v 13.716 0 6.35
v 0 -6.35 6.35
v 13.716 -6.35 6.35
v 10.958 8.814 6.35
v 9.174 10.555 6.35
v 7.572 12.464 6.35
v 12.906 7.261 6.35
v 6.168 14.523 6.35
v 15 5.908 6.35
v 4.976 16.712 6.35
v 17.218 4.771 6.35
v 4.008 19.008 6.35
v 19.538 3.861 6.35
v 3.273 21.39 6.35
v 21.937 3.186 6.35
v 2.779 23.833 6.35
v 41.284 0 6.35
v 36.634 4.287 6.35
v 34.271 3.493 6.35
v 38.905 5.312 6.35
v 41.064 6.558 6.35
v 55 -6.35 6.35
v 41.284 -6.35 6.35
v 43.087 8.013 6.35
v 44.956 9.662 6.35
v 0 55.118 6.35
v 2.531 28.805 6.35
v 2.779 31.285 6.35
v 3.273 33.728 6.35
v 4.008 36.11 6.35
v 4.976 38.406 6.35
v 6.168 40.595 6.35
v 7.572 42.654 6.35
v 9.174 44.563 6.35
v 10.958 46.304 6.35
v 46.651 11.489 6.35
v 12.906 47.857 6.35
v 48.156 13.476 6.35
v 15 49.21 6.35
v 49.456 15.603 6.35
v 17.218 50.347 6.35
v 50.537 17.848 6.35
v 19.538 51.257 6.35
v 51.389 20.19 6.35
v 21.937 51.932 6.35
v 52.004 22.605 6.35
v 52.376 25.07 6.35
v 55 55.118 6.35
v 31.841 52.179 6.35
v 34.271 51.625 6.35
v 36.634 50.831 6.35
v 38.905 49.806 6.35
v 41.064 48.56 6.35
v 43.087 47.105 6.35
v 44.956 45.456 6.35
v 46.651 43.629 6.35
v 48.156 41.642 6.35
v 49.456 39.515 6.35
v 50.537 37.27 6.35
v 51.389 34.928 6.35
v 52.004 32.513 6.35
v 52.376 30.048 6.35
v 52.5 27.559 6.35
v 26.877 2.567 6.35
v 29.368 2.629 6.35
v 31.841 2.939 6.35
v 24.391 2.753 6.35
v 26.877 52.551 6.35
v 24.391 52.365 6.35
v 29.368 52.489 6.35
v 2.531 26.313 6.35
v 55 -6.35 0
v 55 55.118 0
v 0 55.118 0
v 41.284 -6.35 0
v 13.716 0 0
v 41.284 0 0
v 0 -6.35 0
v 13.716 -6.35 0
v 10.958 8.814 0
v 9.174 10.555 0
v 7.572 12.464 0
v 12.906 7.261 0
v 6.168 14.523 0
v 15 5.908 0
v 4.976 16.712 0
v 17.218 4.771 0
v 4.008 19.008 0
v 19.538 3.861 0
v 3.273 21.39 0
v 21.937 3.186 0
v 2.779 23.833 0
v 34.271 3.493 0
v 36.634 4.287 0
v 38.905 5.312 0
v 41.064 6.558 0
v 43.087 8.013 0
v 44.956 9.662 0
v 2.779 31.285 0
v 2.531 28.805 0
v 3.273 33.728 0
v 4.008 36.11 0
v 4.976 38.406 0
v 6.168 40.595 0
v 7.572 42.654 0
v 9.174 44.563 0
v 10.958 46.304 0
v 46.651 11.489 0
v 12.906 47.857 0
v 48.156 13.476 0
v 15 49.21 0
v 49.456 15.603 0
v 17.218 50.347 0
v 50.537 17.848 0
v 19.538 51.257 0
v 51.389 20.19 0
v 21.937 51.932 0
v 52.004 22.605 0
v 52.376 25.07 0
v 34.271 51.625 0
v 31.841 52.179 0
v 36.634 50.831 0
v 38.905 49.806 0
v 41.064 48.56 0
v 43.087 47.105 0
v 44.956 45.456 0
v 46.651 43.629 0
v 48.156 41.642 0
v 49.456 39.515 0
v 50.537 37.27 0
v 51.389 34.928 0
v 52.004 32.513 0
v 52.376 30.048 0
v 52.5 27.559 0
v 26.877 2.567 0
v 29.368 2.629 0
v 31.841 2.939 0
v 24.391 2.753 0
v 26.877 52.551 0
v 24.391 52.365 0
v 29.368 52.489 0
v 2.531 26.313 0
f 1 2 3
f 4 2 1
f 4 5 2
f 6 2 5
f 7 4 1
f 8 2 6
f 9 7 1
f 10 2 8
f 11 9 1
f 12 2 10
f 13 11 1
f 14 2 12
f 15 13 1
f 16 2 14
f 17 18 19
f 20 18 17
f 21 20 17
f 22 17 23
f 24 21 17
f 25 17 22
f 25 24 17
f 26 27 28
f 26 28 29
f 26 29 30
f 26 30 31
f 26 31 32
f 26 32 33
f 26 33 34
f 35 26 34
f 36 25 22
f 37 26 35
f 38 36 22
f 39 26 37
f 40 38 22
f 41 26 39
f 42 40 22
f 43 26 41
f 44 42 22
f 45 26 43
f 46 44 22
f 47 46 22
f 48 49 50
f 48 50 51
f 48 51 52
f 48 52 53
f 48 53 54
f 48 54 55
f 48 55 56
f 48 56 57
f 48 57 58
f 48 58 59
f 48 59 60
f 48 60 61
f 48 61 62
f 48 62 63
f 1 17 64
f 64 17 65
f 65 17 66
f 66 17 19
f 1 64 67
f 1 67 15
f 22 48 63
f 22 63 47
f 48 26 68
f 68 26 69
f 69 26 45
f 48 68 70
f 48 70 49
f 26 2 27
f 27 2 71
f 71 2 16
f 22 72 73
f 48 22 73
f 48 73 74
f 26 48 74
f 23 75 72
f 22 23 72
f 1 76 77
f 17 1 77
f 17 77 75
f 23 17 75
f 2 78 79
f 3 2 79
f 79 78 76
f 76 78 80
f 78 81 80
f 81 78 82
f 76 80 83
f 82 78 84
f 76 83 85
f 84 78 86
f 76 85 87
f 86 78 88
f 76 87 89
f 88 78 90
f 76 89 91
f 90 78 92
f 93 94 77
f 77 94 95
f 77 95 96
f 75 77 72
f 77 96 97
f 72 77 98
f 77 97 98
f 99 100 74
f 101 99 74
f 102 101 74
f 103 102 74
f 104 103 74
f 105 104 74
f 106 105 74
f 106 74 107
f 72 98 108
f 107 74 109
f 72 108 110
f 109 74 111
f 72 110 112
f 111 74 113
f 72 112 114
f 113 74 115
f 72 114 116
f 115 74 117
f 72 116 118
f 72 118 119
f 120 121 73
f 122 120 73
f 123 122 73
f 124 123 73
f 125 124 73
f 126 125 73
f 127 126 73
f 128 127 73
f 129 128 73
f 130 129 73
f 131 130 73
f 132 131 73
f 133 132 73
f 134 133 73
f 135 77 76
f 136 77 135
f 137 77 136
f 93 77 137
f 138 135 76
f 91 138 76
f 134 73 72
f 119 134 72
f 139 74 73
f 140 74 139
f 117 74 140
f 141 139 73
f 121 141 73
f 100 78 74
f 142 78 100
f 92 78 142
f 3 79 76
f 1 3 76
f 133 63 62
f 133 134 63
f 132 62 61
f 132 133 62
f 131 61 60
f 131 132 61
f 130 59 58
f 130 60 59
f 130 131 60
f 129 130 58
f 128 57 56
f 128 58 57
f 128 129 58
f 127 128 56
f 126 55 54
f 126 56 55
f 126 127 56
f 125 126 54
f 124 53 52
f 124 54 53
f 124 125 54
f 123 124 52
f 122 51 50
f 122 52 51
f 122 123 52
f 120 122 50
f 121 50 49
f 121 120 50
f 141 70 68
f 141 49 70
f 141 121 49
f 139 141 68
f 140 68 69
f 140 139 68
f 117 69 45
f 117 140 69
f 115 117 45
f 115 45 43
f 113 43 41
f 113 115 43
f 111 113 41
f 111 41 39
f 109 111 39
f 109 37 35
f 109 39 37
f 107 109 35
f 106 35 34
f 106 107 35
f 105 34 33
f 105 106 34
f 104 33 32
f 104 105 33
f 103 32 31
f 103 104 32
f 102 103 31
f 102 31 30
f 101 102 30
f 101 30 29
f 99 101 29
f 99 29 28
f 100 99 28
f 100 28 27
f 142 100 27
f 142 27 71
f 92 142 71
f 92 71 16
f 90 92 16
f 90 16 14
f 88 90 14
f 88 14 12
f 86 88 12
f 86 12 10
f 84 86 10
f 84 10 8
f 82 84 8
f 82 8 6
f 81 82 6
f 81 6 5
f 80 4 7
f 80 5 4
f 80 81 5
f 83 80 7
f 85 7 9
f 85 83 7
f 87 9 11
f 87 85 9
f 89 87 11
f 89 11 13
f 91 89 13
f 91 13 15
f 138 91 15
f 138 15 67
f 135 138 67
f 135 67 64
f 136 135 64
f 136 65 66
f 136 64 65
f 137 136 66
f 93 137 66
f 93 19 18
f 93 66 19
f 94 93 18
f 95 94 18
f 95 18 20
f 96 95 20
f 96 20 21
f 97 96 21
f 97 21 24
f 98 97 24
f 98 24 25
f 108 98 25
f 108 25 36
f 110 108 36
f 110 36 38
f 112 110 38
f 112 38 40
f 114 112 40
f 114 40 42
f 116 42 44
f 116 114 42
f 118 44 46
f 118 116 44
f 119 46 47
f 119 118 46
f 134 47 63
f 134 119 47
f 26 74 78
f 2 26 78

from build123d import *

# Parameters (mm, degrees)
BOSS_EXTRUDE1_DEPTH     = 6.35
CUT_EXTRUDE1_DEPTH      = 79.123725091
CUT_EXTRUDE1_DEPTH_BACK = 79.123725091
SKETCH3_R               = 25.000000038


with BuildPart() as part:
    # Sketch2 → Boss-Extrude1 (new body)
    with BuildSketch(Plane.XY):
        Polygon((13.716, 0), (41.283999982, 0), (41.283999982, -6.35), (54.999999982, -6.35), (54.999999982, 0), (54.999999982, 55.118), (0, 55.118), (0, 0), (0, -6.35), (13.716, -6.35), align=None)
    extrude(amount=BOSS_EXTRUDE1_DEPTH)

    # Sketch3 → Cut-Extrude1 (cut, two sides: drawn at the far end of the back side and taken through both)
    with BuildSketch(Plane.XY.offset(6.35).offset(-CUT_EXTRUDE1_DEPTH_BACK)):
        with Locations((27.499999991, 27.559)):
            Circle(SKETCH3_R)
    extrude(amount=CUT_EXTRUDE1_DEPTH + CUT_EXTRUDE1_DEPTH_BACK, mode=Mode.SUBTRACT)


solid = part.part
